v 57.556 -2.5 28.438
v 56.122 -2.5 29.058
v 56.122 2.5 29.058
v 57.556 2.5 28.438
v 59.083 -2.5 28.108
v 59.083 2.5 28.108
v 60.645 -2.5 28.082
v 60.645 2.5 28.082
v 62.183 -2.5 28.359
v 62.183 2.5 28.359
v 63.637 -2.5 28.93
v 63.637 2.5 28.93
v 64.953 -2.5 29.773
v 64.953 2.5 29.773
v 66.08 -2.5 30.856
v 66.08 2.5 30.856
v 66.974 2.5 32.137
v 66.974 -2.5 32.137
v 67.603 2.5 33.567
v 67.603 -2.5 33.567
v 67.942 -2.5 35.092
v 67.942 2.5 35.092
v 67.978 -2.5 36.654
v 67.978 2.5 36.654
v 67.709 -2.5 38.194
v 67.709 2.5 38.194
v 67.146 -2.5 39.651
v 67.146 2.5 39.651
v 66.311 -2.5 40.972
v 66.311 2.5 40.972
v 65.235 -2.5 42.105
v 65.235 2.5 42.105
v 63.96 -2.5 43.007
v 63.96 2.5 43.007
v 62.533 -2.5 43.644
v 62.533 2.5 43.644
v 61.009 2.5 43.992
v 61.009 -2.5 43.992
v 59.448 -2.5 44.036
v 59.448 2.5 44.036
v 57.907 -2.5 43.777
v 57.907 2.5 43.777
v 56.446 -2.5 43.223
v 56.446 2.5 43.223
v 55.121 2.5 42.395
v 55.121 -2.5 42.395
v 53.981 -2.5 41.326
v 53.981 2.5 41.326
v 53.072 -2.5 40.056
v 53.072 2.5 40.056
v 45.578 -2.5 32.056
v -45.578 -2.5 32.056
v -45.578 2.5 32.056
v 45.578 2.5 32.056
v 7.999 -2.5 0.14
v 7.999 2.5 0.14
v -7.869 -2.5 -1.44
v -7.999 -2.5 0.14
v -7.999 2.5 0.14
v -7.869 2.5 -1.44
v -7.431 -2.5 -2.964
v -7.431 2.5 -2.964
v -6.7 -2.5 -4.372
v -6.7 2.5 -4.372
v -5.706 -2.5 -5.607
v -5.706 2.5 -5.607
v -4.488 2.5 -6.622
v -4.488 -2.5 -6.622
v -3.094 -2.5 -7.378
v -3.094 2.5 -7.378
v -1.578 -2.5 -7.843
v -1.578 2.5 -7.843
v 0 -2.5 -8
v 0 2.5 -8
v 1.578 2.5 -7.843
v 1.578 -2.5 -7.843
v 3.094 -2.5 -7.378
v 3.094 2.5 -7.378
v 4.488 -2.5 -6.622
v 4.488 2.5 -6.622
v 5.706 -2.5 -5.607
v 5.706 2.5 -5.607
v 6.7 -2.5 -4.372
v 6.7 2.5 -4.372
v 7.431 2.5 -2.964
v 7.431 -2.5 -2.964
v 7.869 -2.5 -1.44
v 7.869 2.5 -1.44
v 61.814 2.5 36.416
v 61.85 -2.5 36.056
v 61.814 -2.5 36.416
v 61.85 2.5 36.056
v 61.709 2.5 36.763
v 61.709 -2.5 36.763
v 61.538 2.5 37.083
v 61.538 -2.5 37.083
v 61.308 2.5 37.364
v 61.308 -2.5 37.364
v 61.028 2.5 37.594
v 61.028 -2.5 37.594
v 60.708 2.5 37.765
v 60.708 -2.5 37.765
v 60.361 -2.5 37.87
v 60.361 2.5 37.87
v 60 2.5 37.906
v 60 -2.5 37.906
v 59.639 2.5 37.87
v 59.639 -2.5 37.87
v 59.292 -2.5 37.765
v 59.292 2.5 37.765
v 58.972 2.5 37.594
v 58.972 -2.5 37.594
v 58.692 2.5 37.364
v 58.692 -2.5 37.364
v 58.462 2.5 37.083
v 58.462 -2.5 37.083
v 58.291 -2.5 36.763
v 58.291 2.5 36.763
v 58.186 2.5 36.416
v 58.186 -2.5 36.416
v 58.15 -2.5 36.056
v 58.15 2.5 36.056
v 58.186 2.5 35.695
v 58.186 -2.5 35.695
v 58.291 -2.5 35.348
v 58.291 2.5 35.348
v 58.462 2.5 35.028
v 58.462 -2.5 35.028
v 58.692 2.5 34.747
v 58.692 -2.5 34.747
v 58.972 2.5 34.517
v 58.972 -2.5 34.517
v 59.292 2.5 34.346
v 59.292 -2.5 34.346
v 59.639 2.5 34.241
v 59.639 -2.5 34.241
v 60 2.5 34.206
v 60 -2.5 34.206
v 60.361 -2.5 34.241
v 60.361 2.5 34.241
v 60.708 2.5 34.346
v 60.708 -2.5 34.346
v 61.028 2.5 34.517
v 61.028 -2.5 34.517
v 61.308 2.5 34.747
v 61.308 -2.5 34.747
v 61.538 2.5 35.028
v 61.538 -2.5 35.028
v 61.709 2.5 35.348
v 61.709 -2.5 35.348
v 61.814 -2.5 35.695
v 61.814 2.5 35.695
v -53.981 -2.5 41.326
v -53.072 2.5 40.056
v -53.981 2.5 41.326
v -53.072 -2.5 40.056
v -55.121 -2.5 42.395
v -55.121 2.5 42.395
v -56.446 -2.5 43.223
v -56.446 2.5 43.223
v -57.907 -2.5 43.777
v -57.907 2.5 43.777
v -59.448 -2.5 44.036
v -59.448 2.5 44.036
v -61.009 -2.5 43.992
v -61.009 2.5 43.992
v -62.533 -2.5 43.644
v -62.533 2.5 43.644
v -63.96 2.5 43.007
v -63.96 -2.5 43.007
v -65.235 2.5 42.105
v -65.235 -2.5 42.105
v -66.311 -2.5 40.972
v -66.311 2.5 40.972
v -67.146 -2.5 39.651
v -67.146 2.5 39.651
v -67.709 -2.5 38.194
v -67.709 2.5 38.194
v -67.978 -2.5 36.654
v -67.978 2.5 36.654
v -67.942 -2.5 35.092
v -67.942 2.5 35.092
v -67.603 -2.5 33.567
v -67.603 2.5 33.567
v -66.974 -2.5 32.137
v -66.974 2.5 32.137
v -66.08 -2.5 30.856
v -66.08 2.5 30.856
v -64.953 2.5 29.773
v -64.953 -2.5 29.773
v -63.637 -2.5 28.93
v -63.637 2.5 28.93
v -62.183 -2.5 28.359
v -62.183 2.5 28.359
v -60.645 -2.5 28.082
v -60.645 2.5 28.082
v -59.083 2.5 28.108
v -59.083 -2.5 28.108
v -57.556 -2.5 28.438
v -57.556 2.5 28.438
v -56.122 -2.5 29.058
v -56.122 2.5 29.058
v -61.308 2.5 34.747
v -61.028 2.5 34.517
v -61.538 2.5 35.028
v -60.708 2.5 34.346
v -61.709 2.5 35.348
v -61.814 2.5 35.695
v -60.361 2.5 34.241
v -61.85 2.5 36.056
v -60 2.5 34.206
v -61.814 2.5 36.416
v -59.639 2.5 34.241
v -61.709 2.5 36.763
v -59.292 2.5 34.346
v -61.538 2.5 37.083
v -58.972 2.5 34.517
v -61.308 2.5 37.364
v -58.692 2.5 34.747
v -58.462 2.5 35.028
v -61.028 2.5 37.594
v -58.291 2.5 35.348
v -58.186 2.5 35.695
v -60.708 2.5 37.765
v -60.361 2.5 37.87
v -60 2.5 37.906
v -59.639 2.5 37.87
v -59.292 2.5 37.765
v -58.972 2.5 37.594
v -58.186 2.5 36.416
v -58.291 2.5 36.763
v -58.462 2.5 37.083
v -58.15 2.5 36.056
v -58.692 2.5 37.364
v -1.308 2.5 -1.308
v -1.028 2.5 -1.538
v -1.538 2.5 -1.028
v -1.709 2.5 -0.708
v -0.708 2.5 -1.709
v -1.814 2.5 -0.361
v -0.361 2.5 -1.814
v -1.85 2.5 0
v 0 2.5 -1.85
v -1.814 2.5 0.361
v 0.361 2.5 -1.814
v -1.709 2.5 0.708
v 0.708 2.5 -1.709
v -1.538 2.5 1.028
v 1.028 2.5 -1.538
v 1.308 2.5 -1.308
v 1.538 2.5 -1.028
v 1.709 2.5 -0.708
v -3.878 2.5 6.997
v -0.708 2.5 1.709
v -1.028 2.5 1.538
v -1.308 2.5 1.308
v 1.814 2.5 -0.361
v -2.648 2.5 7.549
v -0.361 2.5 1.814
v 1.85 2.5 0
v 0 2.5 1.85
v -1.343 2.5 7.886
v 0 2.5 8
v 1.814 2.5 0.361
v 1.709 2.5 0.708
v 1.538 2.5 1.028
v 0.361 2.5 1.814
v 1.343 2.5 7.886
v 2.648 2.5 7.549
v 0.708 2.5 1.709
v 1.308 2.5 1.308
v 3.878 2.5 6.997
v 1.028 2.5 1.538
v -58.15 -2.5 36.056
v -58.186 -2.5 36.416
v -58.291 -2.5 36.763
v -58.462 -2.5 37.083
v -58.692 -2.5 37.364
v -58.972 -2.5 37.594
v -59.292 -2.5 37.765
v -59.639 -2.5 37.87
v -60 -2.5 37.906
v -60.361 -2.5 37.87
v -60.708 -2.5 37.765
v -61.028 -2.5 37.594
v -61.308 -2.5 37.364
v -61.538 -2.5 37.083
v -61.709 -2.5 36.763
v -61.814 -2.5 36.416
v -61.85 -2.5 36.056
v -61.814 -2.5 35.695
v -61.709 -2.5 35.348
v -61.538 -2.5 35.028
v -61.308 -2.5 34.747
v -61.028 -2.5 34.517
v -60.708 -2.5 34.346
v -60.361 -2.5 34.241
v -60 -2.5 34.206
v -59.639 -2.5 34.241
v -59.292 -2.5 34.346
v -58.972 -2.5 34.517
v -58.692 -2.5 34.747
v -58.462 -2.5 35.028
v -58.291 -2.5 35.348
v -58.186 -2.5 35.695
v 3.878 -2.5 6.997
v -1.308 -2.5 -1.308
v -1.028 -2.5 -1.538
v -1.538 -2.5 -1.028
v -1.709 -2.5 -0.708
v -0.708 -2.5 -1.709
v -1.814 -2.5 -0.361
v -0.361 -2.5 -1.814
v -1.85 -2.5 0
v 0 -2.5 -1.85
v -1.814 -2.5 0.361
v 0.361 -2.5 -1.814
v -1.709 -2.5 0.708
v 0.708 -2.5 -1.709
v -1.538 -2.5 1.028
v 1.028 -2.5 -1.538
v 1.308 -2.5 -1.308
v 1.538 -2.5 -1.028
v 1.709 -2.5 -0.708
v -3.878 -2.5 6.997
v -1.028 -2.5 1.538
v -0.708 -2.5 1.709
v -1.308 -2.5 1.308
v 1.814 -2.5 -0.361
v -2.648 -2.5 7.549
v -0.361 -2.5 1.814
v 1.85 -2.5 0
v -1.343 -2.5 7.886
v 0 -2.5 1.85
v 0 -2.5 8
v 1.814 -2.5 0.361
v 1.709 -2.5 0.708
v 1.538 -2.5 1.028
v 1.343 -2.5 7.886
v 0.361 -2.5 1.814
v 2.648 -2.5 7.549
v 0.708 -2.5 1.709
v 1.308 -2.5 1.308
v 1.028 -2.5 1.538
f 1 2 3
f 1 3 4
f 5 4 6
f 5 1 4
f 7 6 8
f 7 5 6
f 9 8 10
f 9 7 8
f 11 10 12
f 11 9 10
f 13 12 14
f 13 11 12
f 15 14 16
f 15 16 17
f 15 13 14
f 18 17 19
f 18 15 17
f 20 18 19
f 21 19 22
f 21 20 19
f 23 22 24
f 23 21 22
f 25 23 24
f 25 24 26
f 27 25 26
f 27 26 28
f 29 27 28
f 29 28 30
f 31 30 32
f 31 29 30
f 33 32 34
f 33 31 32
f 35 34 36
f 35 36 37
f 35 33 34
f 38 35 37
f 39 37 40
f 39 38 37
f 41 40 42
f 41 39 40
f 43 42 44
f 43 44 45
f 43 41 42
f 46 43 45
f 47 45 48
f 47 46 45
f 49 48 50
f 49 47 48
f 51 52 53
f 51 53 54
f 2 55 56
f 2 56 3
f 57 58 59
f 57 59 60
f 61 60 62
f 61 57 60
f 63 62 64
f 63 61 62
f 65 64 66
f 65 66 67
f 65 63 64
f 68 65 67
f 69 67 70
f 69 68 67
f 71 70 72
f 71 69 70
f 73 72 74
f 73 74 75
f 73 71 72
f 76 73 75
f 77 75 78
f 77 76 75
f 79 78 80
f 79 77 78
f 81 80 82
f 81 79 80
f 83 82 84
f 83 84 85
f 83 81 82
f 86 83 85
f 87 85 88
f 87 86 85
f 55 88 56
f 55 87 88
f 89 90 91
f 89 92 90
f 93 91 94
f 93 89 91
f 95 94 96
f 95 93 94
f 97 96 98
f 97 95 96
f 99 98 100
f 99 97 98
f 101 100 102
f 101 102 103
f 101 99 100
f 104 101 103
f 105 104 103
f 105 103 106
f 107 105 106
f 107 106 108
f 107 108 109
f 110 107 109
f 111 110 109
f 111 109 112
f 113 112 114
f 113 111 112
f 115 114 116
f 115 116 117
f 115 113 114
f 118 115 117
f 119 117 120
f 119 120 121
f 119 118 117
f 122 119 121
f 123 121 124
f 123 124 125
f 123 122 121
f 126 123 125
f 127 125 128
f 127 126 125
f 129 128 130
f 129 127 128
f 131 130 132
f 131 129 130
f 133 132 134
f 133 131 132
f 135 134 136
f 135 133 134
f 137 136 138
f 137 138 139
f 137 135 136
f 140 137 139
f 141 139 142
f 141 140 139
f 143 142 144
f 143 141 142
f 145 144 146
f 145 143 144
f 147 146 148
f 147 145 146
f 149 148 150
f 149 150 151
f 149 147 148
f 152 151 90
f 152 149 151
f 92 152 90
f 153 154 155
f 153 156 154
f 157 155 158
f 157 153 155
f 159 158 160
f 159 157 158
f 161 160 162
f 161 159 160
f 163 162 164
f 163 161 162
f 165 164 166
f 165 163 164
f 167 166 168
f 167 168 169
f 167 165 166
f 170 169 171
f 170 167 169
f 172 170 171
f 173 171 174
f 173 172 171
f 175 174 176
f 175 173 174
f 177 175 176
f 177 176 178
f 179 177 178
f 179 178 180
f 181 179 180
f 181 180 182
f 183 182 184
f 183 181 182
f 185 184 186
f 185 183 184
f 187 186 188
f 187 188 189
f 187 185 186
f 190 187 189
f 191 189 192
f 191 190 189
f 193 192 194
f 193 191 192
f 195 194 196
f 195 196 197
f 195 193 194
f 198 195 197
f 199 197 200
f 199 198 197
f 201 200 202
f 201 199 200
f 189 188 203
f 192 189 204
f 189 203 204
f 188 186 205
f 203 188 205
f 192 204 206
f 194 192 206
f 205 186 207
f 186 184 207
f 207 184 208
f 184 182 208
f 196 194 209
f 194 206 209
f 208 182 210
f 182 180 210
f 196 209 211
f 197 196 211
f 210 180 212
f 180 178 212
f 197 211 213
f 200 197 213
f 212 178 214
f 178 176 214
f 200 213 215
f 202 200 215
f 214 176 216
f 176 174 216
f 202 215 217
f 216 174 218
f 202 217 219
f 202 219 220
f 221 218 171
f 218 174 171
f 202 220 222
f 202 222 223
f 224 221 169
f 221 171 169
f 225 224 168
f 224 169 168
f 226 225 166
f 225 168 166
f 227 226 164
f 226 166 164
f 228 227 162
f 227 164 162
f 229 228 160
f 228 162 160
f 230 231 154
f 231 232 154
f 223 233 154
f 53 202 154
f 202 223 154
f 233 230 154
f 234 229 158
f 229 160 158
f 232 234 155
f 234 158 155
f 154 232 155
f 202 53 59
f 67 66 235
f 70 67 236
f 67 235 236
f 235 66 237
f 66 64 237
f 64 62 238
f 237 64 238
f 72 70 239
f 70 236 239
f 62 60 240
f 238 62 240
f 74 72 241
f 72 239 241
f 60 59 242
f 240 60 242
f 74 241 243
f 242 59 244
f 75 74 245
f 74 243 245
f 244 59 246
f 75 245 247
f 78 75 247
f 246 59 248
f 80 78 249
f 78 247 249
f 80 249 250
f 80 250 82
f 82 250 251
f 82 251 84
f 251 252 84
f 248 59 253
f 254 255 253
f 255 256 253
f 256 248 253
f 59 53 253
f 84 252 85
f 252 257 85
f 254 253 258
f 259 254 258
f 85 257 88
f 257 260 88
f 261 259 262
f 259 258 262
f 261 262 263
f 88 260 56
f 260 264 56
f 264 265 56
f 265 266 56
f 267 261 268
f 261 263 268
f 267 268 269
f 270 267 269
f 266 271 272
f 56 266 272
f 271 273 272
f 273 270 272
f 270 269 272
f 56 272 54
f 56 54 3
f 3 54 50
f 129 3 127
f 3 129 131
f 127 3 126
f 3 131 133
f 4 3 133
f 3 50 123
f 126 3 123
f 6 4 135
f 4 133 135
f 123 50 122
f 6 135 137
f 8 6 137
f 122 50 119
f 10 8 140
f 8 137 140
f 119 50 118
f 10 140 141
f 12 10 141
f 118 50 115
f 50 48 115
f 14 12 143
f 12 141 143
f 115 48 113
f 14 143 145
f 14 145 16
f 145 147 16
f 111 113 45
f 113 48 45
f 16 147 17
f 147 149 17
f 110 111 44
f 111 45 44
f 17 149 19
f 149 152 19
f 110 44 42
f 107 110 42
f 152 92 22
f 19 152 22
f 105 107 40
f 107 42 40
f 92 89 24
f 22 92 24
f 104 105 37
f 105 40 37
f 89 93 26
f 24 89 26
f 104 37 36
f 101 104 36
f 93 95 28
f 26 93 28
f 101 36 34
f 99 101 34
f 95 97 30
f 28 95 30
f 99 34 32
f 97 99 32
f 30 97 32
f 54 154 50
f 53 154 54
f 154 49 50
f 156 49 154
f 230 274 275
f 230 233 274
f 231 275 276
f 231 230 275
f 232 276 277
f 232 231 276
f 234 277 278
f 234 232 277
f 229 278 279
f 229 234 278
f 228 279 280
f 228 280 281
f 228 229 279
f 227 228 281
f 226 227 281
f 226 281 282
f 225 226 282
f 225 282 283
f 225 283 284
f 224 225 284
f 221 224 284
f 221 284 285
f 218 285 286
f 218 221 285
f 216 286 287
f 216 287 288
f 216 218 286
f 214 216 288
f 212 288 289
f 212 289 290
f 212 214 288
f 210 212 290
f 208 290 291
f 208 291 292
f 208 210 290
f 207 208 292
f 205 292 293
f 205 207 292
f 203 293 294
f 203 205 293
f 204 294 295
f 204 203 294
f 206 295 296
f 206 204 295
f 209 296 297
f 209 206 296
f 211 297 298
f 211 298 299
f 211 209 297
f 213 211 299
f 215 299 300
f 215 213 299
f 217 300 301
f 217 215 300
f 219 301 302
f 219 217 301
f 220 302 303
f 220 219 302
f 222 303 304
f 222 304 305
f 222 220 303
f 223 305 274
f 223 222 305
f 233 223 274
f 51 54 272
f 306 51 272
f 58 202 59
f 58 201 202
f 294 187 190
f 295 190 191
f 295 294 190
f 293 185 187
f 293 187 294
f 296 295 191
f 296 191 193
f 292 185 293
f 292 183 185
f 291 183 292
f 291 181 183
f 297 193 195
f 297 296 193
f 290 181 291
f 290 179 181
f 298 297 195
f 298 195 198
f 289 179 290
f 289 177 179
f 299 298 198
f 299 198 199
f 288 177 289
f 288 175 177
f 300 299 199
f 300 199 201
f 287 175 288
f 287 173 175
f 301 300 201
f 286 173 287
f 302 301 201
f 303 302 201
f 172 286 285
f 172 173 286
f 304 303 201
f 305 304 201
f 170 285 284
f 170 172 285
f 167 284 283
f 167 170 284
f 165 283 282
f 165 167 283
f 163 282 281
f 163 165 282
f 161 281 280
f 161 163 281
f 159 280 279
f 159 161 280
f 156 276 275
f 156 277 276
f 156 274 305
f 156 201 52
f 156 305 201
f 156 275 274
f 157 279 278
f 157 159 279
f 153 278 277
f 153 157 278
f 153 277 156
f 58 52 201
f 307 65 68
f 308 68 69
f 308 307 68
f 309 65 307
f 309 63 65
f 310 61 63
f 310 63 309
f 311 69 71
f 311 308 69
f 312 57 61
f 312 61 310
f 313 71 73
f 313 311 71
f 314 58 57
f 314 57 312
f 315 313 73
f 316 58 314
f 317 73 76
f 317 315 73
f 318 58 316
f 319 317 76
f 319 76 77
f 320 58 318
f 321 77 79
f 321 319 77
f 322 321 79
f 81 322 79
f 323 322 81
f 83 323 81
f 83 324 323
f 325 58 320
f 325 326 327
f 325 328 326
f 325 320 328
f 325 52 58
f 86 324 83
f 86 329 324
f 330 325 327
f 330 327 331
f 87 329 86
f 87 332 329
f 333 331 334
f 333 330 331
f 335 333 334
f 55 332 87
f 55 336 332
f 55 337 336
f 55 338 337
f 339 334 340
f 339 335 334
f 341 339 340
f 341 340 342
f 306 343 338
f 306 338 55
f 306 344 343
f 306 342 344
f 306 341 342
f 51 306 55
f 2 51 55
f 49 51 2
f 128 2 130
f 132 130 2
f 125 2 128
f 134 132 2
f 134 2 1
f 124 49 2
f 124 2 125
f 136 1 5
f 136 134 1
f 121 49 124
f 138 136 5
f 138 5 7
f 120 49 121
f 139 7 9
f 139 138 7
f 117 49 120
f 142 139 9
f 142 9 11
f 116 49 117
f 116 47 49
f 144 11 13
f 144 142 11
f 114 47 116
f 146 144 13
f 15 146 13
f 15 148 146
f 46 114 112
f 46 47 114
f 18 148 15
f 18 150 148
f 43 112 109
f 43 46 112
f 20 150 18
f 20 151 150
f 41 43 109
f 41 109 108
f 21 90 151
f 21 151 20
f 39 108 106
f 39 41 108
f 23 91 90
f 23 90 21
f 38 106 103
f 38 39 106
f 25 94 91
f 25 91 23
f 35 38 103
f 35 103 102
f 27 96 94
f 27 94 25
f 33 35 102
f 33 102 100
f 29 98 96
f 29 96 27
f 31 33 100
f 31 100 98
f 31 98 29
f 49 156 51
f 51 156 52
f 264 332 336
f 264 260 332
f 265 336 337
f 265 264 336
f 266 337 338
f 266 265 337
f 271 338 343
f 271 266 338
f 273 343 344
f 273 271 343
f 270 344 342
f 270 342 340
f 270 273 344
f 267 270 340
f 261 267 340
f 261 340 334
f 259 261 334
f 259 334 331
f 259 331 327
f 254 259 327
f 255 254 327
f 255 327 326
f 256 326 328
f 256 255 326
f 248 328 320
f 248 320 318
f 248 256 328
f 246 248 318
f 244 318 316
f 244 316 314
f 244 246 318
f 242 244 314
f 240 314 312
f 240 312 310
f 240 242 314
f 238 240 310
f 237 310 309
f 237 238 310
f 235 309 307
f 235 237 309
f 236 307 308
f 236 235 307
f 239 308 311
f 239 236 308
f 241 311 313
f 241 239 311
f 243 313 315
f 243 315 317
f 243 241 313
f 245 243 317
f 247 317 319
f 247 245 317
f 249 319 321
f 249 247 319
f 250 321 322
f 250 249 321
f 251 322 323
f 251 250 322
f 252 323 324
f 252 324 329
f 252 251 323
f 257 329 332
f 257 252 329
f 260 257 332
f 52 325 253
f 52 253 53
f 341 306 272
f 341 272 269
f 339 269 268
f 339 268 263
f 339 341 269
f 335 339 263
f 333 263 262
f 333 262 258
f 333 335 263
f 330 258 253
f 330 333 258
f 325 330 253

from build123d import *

# Parameters (mm, degrees)
F0_R     = 1.85
F1_DEPTH = 2.5


with BuildPart() as f1:
    # F0 (on Front) → F1 (new body, symmetric)
    with BuildSketch(Plane.XZ):
        with BuildLine():
            Line((-56.121855, 29.058371), (-7.998775, 0.139999))
            ThreePointArc((-7.998775, 0.139999), (0, -8), (7.998775, 0.139999))
            Line((7.998775, 0.139999), (56.121855, 29.058371))
            ThreePointArc((56.121855, 29.058371), (67.708993, 38.193603), (53.071797, 40.055513))
            Line((53.071797, 40.055513), (-53.071797, 40.055513))
            ThreePointArc((-53.071797, 40.055513), (-67.708993, 38.193603), (-56.121855, 29.058371))
        make_face()
        Circle(F0_R, mode=Mode.SUBTRACT)
        with Locations((-60, 36.055513)):
            Circle(F0_R, mode=Mode.SUBTRACT)
        with BuildLine():
            Line((-45.577795, 32.055513), (45.577795, 32.055513))
            Line((45.577795, 32.055513), (3.878145, 6.997142))
            ThreePointArc((3.878145, 6.997142), (0, 8), (-3.878145, 6.997142))
            Line((-3.878145, 6.997142), (-45.577795, 32.055513))
        make_face(mode=Mode.SUBTRACT)
        with Locations((60, 36.055513)):
            Circle(F0_R, mode=Mode.SUBTRACT)
    extrude(amount=F1_DEPTH, both=True)


solid = f1.part
